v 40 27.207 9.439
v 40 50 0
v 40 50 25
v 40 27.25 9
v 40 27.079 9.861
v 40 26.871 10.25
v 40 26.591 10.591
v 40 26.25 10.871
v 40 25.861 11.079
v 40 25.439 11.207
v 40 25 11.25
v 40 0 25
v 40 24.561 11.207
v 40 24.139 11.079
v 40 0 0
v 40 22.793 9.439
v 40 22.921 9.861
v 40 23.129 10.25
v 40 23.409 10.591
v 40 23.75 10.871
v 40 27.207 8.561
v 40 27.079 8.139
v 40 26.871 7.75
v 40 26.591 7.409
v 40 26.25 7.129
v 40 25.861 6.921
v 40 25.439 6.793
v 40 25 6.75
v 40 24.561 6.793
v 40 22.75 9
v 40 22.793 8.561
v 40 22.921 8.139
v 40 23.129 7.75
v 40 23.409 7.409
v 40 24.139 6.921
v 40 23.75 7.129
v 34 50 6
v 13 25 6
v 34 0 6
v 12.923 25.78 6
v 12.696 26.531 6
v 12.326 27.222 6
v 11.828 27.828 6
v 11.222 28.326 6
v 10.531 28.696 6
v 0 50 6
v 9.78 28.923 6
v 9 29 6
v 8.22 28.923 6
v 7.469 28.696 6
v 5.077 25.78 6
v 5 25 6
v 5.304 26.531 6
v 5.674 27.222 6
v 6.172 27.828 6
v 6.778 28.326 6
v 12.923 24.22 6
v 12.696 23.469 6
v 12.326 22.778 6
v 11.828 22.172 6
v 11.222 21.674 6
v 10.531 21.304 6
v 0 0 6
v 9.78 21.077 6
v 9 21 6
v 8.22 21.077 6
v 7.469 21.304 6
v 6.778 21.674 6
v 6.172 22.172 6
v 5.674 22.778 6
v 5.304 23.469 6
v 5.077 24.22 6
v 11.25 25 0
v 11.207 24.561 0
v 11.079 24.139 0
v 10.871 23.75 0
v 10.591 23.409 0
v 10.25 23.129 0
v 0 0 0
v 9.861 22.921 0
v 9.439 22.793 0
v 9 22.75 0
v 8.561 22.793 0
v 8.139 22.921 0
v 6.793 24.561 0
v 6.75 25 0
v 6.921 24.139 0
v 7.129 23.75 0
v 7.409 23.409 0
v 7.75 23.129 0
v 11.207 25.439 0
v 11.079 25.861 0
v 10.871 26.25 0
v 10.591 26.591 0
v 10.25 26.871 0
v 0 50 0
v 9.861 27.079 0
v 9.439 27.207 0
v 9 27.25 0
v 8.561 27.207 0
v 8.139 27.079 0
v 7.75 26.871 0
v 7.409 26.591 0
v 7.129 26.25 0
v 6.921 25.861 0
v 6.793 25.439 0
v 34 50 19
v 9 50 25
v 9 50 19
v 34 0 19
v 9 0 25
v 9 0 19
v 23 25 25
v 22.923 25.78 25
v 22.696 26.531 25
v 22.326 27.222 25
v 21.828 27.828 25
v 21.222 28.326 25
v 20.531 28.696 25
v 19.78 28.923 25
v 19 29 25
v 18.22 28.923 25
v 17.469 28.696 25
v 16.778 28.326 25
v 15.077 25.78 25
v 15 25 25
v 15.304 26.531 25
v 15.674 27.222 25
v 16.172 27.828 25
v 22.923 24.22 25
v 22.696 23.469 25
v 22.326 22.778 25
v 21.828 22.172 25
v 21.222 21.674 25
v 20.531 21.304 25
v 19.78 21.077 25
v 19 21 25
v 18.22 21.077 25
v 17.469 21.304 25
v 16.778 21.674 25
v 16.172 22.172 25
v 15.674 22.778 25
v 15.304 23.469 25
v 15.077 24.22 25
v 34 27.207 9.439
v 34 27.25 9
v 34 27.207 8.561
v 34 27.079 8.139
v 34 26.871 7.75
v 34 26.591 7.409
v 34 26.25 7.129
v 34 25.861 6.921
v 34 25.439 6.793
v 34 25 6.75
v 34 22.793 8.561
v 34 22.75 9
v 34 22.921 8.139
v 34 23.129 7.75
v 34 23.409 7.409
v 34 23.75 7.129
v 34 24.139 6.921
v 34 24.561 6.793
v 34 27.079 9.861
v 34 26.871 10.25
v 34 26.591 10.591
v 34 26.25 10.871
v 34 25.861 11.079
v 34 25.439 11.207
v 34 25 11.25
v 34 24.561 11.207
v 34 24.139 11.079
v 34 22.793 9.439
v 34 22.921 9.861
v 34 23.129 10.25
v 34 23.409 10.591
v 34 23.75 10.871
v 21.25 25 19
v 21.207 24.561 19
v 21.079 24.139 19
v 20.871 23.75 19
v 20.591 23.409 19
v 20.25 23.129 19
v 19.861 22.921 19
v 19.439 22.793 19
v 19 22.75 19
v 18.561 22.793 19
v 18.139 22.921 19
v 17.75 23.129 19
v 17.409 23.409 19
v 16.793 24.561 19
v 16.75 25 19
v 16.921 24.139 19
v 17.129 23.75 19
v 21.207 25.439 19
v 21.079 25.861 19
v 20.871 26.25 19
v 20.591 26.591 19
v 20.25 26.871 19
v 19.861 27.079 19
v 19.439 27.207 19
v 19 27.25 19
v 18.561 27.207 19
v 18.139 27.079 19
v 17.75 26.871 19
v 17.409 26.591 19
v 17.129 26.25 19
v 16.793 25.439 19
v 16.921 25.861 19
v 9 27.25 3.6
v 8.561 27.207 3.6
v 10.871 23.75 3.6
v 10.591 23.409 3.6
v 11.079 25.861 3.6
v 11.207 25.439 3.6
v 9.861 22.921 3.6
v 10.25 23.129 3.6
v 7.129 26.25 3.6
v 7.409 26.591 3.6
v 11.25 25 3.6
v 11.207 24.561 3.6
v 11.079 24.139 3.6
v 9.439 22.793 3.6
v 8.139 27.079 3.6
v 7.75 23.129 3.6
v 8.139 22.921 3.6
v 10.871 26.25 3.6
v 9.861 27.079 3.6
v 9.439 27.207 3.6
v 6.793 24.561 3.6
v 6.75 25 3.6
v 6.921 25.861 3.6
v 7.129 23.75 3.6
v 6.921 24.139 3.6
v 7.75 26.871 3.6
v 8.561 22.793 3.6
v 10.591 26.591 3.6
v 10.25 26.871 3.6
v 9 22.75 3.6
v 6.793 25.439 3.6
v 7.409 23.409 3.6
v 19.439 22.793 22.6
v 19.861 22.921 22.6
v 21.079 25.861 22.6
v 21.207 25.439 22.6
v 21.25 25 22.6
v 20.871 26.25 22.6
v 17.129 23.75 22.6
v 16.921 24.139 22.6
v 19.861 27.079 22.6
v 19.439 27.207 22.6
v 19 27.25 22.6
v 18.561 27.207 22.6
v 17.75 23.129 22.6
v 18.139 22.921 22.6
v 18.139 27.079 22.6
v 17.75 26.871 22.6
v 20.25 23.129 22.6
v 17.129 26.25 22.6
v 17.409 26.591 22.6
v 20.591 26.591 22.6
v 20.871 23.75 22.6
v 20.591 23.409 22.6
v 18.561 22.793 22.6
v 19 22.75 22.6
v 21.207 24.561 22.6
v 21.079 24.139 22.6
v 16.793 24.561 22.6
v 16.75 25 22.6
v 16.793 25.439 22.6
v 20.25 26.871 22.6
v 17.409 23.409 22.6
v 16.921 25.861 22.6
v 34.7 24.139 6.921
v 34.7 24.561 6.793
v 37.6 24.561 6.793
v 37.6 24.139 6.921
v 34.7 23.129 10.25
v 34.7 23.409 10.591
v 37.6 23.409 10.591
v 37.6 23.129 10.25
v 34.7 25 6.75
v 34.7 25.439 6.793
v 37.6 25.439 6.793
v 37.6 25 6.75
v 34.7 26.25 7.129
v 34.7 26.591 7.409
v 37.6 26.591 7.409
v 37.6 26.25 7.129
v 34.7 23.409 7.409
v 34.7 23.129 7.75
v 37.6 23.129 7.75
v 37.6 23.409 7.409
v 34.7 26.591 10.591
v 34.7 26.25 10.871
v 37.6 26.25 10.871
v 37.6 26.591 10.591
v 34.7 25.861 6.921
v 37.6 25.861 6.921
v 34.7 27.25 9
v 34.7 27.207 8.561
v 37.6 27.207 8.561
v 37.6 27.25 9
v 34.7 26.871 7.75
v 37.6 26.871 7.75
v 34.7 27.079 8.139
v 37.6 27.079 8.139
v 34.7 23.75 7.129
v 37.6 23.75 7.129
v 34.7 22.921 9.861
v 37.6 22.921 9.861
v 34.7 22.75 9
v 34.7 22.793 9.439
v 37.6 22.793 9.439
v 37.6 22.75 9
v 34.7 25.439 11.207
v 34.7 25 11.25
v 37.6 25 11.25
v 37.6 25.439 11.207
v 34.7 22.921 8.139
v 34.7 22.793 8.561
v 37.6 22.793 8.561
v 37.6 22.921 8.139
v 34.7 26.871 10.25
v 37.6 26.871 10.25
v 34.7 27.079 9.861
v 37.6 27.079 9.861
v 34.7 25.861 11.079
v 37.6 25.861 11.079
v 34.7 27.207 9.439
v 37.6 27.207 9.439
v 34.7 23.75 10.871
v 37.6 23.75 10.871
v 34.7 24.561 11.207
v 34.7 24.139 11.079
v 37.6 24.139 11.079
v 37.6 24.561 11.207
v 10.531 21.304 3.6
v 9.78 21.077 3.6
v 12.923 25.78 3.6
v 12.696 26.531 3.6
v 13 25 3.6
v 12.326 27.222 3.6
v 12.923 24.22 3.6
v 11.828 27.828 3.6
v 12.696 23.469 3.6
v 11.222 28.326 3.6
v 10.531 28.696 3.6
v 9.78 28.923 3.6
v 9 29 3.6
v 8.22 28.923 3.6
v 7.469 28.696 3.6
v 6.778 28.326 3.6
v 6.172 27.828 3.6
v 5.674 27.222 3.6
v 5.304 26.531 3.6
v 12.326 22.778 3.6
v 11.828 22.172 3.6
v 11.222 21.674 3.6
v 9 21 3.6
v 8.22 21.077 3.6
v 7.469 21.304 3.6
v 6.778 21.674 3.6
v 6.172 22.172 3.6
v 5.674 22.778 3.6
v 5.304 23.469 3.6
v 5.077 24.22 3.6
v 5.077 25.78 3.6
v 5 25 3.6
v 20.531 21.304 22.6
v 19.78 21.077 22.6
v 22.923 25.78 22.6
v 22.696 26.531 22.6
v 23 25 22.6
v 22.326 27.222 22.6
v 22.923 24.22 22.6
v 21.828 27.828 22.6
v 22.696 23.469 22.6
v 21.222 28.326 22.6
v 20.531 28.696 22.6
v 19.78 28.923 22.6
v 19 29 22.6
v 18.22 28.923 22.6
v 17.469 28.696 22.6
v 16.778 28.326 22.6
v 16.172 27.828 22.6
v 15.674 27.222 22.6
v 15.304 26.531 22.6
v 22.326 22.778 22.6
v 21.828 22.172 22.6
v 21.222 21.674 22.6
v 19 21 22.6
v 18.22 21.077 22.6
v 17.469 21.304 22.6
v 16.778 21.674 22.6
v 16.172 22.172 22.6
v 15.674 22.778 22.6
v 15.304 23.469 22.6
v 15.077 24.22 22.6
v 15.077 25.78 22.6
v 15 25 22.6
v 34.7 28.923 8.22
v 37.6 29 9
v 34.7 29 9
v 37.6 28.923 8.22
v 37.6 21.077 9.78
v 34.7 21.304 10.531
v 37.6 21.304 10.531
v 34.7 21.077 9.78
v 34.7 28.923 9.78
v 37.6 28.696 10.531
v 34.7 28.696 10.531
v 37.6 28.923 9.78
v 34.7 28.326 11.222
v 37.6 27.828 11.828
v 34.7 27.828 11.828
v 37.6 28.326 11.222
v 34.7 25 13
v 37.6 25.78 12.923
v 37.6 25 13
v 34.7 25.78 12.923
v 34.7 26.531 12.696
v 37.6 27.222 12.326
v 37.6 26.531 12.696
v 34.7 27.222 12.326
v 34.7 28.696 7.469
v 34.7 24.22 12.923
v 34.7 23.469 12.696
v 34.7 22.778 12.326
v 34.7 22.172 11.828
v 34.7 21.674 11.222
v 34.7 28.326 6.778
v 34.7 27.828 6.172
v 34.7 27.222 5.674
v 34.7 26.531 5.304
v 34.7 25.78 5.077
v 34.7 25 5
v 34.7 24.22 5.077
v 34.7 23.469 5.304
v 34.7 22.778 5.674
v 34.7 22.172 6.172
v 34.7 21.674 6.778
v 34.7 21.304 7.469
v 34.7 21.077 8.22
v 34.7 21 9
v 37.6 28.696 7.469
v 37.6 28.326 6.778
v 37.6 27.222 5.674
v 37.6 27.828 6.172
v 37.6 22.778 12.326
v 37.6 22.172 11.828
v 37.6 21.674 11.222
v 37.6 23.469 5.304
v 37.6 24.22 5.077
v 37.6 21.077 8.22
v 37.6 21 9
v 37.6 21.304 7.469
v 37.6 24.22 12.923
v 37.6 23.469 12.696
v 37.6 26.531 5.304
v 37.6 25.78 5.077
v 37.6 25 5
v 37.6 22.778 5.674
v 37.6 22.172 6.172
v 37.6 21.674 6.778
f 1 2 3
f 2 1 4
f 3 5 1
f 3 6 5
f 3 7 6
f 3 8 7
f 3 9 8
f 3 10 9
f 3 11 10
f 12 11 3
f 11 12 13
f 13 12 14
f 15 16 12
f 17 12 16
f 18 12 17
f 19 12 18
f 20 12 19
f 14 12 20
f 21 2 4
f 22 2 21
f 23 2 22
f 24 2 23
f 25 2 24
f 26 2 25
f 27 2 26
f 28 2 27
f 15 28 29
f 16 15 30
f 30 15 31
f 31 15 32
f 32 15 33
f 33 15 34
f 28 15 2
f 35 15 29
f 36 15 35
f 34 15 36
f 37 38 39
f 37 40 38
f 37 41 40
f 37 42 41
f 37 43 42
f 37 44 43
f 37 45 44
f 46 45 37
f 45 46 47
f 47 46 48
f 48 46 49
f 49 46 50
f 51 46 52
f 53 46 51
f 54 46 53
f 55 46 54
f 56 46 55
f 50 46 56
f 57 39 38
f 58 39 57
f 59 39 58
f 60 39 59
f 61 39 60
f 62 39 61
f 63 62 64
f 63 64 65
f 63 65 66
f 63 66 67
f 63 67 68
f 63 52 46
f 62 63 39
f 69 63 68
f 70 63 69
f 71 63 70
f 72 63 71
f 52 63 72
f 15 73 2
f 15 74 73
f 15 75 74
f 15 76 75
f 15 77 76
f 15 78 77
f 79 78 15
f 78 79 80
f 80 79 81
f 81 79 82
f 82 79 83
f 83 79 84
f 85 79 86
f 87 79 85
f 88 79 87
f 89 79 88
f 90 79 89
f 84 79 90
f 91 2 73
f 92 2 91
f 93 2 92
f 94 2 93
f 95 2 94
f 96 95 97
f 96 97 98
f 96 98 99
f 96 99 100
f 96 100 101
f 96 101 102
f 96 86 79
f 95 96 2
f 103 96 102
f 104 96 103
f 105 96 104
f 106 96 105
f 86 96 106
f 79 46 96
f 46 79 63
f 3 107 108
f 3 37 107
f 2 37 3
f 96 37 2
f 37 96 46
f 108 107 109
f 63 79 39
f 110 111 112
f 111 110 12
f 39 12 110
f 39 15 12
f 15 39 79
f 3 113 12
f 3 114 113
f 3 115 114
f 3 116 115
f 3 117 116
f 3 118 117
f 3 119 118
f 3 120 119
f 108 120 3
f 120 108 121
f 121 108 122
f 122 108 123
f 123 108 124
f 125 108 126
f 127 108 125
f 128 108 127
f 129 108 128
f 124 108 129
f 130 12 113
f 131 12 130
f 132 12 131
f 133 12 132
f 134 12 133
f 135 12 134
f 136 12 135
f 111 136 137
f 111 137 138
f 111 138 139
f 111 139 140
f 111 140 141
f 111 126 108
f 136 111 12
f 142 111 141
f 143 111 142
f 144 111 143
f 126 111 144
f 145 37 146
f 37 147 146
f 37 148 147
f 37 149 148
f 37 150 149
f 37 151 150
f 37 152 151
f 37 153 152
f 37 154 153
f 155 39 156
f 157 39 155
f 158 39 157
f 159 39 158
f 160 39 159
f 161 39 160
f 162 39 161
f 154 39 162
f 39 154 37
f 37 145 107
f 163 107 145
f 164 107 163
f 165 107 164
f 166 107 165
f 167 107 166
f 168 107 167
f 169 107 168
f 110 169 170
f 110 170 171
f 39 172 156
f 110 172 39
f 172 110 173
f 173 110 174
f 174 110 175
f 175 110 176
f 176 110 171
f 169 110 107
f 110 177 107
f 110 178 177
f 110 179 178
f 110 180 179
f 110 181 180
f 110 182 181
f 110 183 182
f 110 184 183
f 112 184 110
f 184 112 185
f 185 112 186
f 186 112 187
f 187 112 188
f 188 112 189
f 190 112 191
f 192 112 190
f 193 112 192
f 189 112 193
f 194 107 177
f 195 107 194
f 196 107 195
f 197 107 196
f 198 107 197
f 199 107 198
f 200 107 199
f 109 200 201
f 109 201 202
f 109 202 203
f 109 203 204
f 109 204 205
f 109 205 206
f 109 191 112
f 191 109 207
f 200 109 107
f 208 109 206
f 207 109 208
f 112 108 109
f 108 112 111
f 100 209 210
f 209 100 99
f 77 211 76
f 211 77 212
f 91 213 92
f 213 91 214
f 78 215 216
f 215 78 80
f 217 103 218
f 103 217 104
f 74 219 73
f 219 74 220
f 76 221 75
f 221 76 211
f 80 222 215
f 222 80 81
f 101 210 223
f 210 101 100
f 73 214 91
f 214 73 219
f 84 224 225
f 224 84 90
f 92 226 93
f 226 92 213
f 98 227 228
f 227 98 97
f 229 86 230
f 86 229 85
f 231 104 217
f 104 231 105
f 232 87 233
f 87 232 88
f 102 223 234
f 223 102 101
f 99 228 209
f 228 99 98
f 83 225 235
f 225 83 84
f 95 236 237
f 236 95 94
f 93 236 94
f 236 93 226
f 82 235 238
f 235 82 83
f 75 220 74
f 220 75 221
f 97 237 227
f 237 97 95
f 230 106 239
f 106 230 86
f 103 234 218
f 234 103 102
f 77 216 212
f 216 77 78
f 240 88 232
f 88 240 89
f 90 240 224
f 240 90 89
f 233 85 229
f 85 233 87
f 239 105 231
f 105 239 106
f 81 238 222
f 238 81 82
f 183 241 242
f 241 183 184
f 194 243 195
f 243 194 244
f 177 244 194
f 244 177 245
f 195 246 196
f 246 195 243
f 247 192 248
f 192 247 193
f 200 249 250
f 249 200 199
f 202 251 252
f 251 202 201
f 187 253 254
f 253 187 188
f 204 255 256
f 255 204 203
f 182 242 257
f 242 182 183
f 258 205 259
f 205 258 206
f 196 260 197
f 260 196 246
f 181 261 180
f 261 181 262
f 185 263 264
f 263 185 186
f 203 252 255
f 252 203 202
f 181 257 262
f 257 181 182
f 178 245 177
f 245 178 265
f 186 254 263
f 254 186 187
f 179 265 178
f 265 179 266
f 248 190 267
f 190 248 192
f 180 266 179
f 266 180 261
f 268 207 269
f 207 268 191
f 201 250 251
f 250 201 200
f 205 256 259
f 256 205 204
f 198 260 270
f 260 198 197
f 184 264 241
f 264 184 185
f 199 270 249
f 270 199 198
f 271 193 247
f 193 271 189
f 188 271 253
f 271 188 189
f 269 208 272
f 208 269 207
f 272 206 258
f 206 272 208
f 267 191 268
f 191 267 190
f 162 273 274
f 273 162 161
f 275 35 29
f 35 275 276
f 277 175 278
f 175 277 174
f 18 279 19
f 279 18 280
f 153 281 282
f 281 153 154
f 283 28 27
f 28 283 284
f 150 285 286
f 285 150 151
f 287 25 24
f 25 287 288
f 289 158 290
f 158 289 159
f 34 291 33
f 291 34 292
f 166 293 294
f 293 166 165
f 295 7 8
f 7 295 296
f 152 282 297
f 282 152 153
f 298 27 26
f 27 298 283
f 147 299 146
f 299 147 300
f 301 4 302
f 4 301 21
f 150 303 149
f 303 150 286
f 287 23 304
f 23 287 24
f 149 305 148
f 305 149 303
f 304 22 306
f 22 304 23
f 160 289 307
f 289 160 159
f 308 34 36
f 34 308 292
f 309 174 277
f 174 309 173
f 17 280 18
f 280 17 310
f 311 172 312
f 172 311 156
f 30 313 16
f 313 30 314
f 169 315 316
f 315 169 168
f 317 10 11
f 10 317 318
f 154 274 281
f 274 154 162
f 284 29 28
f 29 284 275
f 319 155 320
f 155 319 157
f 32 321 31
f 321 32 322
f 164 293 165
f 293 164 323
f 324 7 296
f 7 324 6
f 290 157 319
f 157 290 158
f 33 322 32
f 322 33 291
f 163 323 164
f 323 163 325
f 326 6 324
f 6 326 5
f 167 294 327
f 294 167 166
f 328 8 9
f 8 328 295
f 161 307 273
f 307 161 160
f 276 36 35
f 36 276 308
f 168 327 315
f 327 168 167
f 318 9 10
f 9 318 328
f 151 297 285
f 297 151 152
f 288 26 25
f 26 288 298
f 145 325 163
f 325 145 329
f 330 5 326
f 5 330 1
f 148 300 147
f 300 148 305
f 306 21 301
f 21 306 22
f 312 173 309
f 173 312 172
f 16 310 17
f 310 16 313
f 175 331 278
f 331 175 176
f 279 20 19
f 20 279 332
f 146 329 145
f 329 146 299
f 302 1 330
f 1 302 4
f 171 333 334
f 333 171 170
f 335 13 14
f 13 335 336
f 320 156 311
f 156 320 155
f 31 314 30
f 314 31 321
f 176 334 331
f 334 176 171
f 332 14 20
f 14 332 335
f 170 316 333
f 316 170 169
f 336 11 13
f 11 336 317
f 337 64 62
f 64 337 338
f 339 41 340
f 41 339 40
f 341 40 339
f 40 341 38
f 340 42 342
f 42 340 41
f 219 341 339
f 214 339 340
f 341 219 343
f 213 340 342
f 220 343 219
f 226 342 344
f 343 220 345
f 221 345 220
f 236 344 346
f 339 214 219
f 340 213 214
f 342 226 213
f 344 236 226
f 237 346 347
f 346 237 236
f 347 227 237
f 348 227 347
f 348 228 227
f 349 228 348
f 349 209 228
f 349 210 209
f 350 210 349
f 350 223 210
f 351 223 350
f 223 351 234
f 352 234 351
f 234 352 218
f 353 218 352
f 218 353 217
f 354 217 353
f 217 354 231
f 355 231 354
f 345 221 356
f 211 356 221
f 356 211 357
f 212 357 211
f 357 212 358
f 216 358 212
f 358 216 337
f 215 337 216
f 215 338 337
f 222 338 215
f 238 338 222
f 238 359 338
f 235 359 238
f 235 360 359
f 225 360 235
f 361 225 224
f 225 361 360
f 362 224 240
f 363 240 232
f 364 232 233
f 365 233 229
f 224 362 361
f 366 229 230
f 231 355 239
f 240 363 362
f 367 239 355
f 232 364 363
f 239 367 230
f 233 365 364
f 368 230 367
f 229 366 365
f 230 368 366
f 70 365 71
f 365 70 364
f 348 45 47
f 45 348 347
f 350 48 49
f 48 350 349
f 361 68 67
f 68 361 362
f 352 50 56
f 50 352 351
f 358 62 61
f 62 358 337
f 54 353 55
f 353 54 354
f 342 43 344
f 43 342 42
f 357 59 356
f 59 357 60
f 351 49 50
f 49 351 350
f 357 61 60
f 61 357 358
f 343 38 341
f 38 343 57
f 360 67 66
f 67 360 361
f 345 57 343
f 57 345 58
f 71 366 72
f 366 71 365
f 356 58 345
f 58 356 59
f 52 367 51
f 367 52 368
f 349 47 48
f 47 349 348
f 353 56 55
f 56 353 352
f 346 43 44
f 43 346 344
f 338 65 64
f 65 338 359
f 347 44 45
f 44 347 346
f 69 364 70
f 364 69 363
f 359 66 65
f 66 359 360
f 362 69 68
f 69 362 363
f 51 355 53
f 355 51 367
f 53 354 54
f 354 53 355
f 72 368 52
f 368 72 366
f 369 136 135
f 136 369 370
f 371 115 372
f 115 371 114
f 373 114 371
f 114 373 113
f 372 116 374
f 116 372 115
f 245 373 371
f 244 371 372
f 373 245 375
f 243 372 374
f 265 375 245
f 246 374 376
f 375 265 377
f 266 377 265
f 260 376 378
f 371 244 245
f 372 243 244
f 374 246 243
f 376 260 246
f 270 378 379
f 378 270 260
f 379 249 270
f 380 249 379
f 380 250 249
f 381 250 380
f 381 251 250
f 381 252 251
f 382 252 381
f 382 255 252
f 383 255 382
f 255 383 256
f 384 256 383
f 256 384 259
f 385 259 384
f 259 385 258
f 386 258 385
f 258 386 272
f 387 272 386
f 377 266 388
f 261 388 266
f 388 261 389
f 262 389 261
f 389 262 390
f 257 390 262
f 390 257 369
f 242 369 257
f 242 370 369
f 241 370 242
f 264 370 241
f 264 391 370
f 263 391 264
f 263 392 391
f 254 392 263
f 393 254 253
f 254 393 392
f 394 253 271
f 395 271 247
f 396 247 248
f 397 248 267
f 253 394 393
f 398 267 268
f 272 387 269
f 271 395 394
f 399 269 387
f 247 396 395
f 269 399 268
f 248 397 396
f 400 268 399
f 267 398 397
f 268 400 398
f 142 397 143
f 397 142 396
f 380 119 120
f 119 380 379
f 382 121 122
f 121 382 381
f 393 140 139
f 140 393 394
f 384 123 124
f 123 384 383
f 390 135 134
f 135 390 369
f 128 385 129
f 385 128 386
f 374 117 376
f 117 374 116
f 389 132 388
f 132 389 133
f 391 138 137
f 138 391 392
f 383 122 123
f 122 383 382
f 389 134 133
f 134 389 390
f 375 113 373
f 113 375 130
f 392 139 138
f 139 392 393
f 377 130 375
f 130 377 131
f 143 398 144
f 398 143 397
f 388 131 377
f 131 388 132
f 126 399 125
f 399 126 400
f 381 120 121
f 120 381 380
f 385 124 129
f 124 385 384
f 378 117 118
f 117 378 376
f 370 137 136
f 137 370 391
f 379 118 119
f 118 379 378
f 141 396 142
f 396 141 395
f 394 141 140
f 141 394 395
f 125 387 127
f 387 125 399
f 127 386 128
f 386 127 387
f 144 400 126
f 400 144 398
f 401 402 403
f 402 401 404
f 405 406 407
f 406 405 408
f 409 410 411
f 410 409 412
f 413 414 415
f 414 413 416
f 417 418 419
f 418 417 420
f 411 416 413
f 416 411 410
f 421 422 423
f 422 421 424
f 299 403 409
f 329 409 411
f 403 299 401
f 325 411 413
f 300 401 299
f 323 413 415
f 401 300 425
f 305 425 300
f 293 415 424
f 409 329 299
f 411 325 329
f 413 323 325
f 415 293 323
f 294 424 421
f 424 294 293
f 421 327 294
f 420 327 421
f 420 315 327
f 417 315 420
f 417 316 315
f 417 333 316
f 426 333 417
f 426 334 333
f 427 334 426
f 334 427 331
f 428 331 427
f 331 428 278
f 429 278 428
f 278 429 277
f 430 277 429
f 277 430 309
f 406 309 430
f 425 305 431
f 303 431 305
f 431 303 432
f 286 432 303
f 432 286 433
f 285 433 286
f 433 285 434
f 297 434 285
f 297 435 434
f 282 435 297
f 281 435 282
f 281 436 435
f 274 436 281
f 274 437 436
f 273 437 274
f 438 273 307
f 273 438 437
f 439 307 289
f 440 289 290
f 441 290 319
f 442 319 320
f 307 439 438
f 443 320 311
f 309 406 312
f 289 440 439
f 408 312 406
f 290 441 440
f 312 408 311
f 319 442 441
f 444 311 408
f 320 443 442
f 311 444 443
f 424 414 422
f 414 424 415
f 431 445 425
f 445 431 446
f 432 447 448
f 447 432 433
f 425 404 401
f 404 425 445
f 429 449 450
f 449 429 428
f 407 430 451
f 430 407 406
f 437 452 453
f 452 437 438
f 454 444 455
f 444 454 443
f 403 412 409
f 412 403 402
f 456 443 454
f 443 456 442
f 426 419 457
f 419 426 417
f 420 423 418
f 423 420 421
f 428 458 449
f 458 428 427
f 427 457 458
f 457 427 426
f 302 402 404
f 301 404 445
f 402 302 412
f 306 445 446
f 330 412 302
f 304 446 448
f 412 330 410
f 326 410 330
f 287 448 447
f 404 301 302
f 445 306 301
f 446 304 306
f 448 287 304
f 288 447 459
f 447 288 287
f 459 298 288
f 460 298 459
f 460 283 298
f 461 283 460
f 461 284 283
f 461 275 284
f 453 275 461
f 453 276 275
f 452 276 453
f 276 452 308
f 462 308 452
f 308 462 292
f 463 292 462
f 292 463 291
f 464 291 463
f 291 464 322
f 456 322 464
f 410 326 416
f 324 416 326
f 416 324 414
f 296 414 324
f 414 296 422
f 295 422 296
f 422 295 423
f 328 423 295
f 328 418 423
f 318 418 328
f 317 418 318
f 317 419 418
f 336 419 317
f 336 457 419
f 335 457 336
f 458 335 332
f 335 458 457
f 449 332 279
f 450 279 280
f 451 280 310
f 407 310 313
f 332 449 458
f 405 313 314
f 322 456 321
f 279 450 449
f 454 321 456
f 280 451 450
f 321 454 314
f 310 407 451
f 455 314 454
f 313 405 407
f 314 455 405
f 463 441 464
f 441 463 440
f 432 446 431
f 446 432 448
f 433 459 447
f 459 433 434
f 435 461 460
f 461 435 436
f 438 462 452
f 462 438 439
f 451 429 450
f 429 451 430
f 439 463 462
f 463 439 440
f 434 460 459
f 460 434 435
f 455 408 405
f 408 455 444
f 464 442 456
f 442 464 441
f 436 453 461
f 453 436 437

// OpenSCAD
$fn = 32;

// ----------------------------------------------------------------------
// Z-bracket: 40 x 50 x 25 mm
// ----------------------------------------------------------------------

// --- parameters (mm) ---
foot_len = 40;            // lower foot length, X
top_len = 25;             // upper foot length, X
depth = 50;               // bracket width, Y
step_h = 25;              // overall rise, Z
plate_t = 6;              // plate thickness
hole_d = 4.5;             // clearance for M4
cb_d = 8;                 // counterbore diameter
cb_h = 2.4;               // counterbore depth

module hole_z(px, py, z0) {
  translate([px, py, z0 - 0.5]) cylinder(h = plate_t + 1, d = hole_d);
}
module hole_x(py, pz) {
  translate([-0.5, py, pz]) rotate([0, 90, 0]) cylinder(h = plate_t + 1, d = hole_d);
}
module cb_z(px, py, top_z) {
  translate([px, py, top_z - cb_h]) cylinder(h = cb_h + 0.5, d = cb_d);
}
module cb_x(py, pz) {
  translate([plate_t - cb_h, py, pz]) rotate([0, -90, 0]) cylinder(h = cb_h + 0.5, d = cb_d);
}

difference() {
  union() {
    cube([foot_len, depth, plate_t]);
    /* web, overlapping the lower foot */
    translate([foot_len - plate_t, 0, 0]) cube([plate_t, depth, step_h]);
    /* upper foot, sunk into the web */
    translate([foot_len - plate_t - top_len, 0, step_h - plate_t]) cube([top_len + plate_t, depth, plate_t]);
  }
  hole_z(9, 25, 0);
  translate([foot_len - plate_t - 15, 0, 0]) hole_z(0, 25, step_h - plate_t);
  translate([foot_len - plate_t, 0, 0]) hole_x(25, 9);
  cb_z(9, 25, plate_t);
  translate([foot_len - plate_t - 15, 0, 0]) cb_z(0, 25, step_h);
  translate([foot_len - plate_t, 0, 0]) cb_x(25, 9);
}
